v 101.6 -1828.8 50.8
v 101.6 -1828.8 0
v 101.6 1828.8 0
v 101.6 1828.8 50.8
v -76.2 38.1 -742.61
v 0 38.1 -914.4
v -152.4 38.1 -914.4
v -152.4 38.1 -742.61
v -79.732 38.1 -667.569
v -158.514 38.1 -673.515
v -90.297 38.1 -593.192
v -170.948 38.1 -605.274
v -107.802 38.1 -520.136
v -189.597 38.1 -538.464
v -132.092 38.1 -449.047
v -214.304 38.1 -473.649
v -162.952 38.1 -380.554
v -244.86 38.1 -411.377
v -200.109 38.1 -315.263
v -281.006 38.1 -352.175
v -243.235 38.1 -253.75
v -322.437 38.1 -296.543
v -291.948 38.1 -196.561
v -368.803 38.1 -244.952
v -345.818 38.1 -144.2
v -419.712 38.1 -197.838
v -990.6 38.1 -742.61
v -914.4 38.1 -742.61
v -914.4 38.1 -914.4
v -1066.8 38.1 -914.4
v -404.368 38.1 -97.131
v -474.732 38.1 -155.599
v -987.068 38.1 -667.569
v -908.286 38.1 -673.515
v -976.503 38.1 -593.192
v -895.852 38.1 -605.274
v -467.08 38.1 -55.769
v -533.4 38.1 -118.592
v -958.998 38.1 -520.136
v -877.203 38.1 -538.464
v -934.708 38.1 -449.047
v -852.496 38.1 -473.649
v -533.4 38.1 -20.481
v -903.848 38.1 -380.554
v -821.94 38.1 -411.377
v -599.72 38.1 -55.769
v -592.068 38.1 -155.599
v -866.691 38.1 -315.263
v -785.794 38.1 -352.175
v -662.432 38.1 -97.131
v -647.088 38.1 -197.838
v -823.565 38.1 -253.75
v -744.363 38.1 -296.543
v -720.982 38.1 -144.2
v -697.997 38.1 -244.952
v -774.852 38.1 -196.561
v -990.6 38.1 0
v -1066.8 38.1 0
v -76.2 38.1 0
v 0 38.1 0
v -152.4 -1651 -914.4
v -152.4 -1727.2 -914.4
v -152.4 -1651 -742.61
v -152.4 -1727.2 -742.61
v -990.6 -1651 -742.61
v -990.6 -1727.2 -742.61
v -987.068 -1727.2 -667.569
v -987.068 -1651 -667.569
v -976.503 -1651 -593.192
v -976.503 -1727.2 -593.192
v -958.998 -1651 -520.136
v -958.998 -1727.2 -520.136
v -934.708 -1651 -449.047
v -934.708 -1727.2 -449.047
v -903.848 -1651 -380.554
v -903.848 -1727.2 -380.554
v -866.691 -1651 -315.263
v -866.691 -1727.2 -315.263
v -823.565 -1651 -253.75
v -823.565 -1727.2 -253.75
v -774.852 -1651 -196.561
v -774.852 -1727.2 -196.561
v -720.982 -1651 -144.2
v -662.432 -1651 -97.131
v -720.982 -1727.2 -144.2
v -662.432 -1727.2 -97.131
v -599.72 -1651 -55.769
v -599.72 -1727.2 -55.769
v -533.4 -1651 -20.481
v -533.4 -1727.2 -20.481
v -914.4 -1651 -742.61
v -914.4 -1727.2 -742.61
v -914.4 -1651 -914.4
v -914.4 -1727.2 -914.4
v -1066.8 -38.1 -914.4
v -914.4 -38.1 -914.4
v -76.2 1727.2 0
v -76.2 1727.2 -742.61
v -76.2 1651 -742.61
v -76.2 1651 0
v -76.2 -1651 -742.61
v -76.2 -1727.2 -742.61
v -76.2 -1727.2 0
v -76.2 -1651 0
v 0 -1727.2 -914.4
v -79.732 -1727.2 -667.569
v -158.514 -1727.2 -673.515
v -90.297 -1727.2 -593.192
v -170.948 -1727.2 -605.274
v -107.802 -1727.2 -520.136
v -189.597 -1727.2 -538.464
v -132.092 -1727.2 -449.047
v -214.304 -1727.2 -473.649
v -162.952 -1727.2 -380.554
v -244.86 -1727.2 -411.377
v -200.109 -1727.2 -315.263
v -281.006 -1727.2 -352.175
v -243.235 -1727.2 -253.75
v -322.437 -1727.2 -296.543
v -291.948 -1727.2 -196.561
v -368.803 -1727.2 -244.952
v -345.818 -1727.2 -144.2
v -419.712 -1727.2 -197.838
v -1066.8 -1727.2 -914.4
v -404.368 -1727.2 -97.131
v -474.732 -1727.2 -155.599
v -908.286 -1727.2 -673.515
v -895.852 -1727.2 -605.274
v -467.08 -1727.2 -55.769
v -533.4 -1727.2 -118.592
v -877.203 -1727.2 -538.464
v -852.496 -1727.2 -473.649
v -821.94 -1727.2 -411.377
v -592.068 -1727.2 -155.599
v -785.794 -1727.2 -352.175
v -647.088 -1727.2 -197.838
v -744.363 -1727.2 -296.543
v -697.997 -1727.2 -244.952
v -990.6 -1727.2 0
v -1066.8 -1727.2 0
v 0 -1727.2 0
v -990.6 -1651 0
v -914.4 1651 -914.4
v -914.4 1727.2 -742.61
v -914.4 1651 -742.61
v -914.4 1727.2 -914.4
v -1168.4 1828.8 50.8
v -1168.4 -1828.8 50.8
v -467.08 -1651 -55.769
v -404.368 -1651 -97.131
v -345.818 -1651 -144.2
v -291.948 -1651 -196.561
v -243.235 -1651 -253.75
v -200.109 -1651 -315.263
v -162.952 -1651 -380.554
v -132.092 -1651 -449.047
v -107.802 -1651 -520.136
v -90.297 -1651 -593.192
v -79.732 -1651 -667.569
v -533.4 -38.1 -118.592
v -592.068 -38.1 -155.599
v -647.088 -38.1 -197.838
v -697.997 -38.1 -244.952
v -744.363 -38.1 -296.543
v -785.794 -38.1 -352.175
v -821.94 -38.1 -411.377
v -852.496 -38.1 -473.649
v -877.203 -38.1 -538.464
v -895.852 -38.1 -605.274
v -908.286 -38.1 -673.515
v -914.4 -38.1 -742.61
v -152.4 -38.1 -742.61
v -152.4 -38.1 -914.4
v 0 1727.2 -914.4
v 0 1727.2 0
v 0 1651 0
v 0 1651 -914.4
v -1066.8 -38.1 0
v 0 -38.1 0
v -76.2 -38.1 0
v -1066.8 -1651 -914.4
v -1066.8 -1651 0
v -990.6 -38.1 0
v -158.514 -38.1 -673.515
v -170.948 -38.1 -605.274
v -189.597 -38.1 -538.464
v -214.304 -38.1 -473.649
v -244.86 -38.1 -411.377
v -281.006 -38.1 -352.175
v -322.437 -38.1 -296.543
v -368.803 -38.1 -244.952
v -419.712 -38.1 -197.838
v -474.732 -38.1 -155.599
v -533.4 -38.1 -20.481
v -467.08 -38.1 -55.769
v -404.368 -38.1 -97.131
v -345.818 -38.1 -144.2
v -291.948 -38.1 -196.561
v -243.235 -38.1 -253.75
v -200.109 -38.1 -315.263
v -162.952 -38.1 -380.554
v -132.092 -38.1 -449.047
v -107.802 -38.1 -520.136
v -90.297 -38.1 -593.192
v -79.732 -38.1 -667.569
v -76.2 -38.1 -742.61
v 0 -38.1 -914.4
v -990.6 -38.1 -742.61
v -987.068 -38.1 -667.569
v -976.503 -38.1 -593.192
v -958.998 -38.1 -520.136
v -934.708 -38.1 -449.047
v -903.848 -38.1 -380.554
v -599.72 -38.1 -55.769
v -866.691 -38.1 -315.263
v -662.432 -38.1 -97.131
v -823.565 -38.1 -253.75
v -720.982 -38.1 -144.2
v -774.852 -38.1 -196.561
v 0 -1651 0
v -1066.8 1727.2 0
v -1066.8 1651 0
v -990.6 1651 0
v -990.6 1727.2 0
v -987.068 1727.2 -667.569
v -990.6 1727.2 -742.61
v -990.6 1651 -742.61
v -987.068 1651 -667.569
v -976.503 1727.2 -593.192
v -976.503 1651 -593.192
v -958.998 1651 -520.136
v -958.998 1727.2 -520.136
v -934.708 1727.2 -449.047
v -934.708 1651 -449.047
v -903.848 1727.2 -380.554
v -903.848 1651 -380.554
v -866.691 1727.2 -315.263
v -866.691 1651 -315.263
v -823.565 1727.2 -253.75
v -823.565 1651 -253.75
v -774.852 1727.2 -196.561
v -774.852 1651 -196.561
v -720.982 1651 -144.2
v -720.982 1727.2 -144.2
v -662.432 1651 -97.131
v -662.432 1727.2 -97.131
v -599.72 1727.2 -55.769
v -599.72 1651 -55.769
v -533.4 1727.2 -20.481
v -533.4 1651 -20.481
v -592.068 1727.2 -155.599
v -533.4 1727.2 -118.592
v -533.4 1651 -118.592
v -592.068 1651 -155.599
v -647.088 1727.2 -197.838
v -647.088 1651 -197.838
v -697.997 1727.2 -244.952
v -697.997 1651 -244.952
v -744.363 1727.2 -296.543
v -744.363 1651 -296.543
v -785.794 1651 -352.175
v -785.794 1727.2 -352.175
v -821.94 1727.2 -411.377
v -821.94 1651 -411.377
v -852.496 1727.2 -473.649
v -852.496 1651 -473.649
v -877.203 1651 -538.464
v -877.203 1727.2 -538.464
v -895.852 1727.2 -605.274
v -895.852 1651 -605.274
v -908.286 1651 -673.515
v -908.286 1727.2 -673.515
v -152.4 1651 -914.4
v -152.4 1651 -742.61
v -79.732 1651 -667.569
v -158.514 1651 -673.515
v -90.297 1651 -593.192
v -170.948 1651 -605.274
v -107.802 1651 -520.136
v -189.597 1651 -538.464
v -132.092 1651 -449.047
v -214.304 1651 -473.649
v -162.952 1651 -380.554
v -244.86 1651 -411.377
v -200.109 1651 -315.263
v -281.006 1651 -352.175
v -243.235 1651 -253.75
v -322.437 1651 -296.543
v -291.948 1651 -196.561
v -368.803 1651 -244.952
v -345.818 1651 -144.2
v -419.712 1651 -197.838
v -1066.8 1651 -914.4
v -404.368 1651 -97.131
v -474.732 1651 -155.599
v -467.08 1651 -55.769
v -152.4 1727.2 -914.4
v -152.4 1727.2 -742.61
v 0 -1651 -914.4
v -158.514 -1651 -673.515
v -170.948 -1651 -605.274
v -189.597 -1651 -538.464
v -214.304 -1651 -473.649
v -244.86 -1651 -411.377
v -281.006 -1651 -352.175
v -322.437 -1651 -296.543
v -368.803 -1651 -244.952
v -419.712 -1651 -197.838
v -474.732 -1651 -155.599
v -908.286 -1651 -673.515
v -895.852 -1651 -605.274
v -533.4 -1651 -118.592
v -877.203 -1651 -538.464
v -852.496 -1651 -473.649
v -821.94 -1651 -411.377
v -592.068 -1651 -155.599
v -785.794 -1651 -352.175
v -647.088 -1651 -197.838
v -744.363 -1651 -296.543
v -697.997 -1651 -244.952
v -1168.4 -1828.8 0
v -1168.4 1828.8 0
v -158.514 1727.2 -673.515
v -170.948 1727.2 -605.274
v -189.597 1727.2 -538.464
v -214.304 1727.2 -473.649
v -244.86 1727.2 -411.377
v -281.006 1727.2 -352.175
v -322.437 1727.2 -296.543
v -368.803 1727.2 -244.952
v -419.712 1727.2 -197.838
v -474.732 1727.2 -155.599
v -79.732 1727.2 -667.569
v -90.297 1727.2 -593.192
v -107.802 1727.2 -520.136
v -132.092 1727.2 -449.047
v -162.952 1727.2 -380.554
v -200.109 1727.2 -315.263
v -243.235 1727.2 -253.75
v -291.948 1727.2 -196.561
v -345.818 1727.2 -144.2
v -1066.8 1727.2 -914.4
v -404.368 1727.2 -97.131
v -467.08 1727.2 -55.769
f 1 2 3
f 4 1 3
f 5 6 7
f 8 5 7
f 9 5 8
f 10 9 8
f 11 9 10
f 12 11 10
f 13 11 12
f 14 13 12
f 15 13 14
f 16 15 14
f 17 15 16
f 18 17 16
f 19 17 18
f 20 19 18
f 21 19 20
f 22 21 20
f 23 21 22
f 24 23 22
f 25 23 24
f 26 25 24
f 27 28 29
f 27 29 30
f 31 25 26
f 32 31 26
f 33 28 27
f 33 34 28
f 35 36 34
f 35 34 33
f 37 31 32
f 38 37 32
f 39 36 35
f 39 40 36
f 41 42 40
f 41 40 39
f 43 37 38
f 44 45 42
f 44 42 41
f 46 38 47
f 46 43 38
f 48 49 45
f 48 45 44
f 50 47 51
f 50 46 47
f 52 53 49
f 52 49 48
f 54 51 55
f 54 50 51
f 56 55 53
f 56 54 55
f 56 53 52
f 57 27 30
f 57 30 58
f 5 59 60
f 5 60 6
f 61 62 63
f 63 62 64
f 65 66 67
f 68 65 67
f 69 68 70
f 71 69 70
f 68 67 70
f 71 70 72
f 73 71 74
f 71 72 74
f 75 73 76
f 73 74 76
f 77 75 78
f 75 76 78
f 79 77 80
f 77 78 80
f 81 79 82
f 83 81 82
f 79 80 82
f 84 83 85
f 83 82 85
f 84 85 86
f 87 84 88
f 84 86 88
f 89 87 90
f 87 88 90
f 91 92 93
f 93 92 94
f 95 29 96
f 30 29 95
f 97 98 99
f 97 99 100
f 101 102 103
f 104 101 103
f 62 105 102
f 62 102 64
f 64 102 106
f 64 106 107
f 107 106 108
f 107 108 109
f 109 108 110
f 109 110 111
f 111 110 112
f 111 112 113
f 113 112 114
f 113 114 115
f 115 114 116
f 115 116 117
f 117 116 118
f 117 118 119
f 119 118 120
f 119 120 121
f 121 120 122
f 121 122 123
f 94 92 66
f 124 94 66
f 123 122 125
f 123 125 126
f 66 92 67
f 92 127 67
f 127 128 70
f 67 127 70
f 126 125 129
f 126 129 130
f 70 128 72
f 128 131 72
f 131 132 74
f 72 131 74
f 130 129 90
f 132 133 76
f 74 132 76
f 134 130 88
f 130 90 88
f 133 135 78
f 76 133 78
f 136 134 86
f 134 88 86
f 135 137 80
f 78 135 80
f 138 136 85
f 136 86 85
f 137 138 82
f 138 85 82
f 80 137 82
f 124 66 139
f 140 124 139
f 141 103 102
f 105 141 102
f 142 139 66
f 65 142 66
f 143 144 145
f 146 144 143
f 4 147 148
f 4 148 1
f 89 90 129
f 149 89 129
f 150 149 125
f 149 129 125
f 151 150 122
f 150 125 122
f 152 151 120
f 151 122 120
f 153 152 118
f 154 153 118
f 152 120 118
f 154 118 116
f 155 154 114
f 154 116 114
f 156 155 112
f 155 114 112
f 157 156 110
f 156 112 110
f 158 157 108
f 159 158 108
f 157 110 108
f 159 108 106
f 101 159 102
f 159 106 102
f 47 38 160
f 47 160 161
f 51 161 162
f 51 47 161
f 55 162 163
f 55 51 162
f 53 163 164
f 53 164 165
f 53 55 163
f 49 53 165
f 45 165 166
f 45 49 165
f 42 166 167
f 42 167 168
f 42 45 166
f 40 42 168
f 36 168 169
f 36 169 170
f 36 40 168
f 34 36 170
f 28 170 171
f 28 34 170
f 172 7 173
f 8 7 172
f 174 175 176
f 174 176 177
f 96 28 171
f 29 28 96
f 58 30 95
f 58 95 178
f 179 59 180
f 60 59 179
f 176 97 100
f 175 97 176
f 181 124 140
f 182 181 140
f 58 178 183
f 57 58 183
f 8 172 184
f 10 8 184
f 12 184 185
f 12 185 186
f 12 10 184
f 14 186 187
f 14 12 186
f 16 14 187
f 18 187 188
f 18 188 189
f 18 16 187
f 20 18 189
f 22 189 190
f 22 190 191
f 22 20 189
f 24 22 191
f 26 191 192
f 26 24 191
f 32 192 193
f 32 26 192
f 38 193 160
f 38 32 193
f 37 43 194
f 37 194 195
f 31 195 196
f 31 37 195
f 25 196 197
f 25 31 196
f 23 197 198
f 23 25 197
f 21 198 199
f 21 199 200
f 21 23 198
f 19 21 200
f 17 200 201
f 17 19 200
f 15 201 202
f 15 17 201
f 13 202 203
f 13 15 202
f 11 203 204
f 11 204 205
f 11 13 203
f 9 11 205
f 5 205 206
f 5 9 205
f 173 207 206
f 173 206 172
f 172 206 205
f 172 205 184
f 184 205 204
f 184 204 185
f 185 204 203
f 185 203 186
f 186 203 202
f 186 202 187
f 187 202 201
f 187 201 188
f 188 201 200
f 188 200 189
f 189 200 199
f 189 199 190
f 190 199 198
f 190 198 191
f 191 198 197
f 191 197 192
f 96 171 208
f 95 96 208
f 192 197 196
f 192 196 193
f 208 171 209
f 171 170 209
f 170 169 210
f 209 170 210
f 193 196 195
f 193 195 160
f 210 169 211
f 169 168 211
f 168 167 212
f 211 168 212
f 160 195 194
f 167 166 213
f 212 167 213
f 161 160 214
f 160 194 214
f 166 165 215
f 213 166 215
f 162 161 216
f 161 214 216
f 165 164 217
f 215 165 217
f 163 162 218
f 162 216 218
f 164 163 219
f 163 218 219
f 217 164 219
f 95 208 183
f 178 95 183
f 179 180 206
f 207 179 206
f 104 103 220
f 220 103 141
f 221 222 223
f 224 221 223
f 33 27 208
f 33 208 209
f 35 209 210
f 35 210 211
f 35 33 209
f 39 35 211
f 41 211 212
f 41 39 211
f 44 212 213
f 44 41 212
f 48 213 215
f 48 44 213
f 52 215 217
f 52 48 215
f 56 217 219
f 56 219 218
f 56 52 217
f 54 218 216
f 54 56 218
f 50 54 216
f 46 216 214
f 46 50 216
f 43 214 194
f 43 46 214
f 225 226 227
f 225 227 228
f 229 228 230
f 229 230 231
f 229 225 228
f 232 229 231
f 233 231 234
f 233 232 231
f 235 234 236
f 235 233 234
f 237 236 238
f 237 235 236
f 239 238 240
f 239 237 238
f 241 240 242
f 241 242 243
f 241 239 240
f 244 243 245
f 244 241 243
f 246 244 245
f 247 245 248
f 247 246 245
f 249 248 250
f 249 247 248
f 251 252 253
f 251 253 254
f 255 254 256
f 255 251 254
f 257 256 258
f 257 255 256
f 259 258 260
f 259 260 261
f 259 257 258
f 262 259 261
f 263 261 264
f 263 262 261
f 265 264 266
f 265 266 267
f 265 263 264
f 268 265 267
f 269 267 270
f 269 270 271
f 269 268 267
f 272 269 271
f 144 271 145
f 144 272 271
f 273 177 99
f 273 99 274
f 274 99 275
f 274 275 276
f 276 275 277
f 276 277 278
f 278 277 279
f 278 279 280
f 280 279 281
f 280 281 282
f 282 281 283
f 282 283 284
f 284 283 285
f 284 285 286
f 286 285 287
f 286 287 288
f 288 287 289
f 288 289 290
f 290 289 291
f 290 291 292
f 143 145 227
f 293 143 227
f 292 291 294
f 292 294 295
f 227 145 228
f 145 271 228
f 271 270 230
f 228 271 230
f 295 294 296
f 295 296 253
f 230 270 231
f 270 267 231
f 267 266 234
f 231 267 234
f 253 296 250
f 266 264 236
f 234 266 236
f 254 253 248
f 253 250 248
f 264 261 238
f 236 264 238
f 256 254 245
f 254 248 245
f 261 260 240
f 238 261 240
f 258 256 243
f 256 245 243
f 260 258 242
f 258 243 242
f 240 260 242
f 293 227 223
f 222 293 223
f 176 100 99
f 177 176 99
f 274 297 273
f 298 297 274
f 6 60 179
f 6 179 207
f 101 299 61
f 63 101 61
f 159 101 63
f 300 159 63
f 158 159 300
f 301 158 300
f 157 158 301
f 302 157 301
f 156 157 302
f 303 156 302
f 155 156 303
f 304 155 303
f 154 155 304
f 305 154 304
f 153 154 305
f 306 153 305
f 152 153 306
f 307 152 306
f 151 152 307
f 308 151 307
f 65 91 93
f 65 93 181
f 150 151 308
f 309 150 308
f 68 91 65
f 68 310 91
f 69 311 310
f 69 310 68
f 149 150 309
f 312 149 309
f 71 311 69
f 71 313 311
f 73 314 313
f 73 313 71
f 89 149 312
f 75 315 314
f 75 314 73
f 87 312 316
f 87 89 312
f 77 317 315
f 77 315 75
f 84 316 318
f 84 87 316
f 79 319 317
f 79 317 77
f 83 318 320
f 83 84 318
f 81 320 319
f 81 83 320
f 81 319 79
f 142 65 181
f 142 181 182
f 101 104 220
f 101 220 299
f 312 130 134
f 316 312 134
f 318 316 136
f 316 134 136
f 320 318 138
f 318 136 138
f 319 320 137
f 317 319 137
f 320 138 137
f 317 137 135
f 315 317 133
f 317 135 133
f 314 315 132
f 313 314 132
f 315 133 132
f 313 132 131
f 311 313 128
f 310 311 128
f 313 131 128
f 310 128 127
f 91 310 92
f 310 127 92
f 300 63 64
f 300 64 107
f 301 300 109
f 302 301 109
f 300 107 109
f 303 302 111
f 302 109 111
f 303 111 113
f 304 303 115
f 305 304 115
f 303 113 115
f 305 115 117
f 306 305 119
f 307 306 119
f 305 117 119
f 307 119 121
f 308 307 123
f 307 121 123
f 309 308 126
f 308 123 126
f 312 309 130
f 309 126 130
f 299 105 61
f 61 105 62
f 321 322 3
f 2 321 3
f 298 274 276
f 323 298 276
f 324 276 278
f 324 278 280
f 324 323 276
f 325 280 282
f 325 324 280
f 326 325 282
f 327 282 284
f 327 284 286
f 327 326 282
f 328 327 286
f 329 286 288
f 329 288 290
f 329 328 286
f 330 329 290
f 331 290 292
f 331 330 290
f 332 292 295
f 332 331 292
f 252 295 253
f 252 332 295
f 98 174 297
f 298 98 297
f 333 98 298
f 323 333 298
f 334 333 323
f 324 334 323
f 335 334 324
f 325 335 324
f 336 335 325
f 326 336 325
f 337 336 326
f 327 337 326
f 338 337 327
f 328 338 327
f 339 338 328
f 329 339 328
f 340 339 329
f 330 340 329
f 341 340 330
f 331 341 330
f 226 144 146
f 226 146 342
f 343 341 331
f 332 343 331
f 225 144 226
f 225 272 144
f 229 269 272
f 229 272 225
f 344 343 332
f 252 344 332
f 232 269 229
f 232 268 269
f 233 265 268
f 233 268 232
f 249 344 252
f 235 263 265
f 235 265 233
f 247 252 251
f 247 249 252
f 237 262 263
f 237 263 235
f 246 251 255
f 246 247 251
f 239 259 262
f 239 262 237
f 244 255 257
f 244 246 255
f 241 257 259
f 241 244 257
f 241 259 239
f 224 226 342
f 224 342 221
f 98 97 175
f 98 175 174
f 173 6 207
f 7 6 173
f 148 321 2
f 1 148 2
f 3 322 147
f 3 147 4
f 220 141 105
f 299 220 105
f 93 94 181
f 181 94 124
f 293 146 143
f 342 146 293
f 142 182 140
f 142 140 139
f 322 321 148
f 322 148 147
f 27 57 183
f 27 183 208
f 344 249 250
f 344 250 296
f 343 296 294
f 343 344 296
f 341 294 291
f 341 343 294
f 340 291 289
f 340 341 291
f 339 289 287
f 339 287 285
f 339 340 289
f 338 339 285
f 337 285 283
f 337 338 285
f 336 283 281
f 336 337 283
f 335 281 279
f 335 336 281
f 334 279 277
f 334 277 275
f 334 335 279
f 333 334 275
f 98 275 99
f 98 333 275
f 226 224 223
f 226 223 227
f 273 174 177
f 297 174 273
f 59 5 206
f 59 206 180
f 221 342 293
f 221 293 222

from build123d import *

# Parameters (mm, degrees)
F3_DEPTH = 76.2
F8_W     = 1270
F8_H     = 3657.6
F9_DEPTH = 50.8


with BuildPart() as f3:
    # F2 (on line) → F3 (new body)
    with BuildSketch(Plane(origin=(0, -1727.2, 0), x_dir=(-1, 0, 0), z_dir=(0, 1, 0))):
        Polygon((76.2, 0), (0, 0), (0, -914.4), (76.2, -914.4), (76.2, -742.60971566), align=None)
        with BuildLine():
            ThreePointArc((533.4, -20.4810089839), (200.1093272439, -315.2627521147), (76.2, -742.60971566))
            Line((76.2, -742.60971566), (76.2, -914.4))
            Line((76.2, -914.4), (152.4, -914.4))
            Line((152.4, -914.4), (152.4, -742.60971566))
            ThreePointArc((152.4, -742.60971566), (262.252211808, -381.3604023556), (533.4, -118.5915842652))
            ThreePointArc((533.4, -118.5915842652), (804.547788192, -381.3604023556), (914.4, -742.60971566))
            Line((914.4, -742.60971566), (914.4, -914.4))
            Line((914.4, -914.4), (990.6, -914.4))
            Line((990.6, -914.4), (990.6, -742.60971566))
            ThreePointArc((990.6, -742.60971566), (866.6906727561, -315.2627521147), (533.4, -20.4810089839))
        make_face()
        Polygon((990.6, 0), (990.6, -742.60971566), (990.6, -914.4), (1066.8, -914.4), (1066.8, 0), align=None)
    extrude(amount=F3_DEPTH)


with BuildPart() as f6_1:
    # F6: instance of F3
    add(f3.part.mirror(Plane.XZ.offset(844.55)))


with BuildPart() as f7_1:
    # F7: instance of F3
    add(f3.part.mirror(Plane.XZ))


with BuildPart() as f9:
    # F8 (on Top) → F9 (new body)
    with BuildSketch(Plane.XY):
        with Locations((-533.4, 0)):
            Rectangle(F8_W, F8_H)
    extrude(amount=F9_DEPTH)


solid = Compound([f3.part, f6_1.part, f7_1.part, f9.part])
